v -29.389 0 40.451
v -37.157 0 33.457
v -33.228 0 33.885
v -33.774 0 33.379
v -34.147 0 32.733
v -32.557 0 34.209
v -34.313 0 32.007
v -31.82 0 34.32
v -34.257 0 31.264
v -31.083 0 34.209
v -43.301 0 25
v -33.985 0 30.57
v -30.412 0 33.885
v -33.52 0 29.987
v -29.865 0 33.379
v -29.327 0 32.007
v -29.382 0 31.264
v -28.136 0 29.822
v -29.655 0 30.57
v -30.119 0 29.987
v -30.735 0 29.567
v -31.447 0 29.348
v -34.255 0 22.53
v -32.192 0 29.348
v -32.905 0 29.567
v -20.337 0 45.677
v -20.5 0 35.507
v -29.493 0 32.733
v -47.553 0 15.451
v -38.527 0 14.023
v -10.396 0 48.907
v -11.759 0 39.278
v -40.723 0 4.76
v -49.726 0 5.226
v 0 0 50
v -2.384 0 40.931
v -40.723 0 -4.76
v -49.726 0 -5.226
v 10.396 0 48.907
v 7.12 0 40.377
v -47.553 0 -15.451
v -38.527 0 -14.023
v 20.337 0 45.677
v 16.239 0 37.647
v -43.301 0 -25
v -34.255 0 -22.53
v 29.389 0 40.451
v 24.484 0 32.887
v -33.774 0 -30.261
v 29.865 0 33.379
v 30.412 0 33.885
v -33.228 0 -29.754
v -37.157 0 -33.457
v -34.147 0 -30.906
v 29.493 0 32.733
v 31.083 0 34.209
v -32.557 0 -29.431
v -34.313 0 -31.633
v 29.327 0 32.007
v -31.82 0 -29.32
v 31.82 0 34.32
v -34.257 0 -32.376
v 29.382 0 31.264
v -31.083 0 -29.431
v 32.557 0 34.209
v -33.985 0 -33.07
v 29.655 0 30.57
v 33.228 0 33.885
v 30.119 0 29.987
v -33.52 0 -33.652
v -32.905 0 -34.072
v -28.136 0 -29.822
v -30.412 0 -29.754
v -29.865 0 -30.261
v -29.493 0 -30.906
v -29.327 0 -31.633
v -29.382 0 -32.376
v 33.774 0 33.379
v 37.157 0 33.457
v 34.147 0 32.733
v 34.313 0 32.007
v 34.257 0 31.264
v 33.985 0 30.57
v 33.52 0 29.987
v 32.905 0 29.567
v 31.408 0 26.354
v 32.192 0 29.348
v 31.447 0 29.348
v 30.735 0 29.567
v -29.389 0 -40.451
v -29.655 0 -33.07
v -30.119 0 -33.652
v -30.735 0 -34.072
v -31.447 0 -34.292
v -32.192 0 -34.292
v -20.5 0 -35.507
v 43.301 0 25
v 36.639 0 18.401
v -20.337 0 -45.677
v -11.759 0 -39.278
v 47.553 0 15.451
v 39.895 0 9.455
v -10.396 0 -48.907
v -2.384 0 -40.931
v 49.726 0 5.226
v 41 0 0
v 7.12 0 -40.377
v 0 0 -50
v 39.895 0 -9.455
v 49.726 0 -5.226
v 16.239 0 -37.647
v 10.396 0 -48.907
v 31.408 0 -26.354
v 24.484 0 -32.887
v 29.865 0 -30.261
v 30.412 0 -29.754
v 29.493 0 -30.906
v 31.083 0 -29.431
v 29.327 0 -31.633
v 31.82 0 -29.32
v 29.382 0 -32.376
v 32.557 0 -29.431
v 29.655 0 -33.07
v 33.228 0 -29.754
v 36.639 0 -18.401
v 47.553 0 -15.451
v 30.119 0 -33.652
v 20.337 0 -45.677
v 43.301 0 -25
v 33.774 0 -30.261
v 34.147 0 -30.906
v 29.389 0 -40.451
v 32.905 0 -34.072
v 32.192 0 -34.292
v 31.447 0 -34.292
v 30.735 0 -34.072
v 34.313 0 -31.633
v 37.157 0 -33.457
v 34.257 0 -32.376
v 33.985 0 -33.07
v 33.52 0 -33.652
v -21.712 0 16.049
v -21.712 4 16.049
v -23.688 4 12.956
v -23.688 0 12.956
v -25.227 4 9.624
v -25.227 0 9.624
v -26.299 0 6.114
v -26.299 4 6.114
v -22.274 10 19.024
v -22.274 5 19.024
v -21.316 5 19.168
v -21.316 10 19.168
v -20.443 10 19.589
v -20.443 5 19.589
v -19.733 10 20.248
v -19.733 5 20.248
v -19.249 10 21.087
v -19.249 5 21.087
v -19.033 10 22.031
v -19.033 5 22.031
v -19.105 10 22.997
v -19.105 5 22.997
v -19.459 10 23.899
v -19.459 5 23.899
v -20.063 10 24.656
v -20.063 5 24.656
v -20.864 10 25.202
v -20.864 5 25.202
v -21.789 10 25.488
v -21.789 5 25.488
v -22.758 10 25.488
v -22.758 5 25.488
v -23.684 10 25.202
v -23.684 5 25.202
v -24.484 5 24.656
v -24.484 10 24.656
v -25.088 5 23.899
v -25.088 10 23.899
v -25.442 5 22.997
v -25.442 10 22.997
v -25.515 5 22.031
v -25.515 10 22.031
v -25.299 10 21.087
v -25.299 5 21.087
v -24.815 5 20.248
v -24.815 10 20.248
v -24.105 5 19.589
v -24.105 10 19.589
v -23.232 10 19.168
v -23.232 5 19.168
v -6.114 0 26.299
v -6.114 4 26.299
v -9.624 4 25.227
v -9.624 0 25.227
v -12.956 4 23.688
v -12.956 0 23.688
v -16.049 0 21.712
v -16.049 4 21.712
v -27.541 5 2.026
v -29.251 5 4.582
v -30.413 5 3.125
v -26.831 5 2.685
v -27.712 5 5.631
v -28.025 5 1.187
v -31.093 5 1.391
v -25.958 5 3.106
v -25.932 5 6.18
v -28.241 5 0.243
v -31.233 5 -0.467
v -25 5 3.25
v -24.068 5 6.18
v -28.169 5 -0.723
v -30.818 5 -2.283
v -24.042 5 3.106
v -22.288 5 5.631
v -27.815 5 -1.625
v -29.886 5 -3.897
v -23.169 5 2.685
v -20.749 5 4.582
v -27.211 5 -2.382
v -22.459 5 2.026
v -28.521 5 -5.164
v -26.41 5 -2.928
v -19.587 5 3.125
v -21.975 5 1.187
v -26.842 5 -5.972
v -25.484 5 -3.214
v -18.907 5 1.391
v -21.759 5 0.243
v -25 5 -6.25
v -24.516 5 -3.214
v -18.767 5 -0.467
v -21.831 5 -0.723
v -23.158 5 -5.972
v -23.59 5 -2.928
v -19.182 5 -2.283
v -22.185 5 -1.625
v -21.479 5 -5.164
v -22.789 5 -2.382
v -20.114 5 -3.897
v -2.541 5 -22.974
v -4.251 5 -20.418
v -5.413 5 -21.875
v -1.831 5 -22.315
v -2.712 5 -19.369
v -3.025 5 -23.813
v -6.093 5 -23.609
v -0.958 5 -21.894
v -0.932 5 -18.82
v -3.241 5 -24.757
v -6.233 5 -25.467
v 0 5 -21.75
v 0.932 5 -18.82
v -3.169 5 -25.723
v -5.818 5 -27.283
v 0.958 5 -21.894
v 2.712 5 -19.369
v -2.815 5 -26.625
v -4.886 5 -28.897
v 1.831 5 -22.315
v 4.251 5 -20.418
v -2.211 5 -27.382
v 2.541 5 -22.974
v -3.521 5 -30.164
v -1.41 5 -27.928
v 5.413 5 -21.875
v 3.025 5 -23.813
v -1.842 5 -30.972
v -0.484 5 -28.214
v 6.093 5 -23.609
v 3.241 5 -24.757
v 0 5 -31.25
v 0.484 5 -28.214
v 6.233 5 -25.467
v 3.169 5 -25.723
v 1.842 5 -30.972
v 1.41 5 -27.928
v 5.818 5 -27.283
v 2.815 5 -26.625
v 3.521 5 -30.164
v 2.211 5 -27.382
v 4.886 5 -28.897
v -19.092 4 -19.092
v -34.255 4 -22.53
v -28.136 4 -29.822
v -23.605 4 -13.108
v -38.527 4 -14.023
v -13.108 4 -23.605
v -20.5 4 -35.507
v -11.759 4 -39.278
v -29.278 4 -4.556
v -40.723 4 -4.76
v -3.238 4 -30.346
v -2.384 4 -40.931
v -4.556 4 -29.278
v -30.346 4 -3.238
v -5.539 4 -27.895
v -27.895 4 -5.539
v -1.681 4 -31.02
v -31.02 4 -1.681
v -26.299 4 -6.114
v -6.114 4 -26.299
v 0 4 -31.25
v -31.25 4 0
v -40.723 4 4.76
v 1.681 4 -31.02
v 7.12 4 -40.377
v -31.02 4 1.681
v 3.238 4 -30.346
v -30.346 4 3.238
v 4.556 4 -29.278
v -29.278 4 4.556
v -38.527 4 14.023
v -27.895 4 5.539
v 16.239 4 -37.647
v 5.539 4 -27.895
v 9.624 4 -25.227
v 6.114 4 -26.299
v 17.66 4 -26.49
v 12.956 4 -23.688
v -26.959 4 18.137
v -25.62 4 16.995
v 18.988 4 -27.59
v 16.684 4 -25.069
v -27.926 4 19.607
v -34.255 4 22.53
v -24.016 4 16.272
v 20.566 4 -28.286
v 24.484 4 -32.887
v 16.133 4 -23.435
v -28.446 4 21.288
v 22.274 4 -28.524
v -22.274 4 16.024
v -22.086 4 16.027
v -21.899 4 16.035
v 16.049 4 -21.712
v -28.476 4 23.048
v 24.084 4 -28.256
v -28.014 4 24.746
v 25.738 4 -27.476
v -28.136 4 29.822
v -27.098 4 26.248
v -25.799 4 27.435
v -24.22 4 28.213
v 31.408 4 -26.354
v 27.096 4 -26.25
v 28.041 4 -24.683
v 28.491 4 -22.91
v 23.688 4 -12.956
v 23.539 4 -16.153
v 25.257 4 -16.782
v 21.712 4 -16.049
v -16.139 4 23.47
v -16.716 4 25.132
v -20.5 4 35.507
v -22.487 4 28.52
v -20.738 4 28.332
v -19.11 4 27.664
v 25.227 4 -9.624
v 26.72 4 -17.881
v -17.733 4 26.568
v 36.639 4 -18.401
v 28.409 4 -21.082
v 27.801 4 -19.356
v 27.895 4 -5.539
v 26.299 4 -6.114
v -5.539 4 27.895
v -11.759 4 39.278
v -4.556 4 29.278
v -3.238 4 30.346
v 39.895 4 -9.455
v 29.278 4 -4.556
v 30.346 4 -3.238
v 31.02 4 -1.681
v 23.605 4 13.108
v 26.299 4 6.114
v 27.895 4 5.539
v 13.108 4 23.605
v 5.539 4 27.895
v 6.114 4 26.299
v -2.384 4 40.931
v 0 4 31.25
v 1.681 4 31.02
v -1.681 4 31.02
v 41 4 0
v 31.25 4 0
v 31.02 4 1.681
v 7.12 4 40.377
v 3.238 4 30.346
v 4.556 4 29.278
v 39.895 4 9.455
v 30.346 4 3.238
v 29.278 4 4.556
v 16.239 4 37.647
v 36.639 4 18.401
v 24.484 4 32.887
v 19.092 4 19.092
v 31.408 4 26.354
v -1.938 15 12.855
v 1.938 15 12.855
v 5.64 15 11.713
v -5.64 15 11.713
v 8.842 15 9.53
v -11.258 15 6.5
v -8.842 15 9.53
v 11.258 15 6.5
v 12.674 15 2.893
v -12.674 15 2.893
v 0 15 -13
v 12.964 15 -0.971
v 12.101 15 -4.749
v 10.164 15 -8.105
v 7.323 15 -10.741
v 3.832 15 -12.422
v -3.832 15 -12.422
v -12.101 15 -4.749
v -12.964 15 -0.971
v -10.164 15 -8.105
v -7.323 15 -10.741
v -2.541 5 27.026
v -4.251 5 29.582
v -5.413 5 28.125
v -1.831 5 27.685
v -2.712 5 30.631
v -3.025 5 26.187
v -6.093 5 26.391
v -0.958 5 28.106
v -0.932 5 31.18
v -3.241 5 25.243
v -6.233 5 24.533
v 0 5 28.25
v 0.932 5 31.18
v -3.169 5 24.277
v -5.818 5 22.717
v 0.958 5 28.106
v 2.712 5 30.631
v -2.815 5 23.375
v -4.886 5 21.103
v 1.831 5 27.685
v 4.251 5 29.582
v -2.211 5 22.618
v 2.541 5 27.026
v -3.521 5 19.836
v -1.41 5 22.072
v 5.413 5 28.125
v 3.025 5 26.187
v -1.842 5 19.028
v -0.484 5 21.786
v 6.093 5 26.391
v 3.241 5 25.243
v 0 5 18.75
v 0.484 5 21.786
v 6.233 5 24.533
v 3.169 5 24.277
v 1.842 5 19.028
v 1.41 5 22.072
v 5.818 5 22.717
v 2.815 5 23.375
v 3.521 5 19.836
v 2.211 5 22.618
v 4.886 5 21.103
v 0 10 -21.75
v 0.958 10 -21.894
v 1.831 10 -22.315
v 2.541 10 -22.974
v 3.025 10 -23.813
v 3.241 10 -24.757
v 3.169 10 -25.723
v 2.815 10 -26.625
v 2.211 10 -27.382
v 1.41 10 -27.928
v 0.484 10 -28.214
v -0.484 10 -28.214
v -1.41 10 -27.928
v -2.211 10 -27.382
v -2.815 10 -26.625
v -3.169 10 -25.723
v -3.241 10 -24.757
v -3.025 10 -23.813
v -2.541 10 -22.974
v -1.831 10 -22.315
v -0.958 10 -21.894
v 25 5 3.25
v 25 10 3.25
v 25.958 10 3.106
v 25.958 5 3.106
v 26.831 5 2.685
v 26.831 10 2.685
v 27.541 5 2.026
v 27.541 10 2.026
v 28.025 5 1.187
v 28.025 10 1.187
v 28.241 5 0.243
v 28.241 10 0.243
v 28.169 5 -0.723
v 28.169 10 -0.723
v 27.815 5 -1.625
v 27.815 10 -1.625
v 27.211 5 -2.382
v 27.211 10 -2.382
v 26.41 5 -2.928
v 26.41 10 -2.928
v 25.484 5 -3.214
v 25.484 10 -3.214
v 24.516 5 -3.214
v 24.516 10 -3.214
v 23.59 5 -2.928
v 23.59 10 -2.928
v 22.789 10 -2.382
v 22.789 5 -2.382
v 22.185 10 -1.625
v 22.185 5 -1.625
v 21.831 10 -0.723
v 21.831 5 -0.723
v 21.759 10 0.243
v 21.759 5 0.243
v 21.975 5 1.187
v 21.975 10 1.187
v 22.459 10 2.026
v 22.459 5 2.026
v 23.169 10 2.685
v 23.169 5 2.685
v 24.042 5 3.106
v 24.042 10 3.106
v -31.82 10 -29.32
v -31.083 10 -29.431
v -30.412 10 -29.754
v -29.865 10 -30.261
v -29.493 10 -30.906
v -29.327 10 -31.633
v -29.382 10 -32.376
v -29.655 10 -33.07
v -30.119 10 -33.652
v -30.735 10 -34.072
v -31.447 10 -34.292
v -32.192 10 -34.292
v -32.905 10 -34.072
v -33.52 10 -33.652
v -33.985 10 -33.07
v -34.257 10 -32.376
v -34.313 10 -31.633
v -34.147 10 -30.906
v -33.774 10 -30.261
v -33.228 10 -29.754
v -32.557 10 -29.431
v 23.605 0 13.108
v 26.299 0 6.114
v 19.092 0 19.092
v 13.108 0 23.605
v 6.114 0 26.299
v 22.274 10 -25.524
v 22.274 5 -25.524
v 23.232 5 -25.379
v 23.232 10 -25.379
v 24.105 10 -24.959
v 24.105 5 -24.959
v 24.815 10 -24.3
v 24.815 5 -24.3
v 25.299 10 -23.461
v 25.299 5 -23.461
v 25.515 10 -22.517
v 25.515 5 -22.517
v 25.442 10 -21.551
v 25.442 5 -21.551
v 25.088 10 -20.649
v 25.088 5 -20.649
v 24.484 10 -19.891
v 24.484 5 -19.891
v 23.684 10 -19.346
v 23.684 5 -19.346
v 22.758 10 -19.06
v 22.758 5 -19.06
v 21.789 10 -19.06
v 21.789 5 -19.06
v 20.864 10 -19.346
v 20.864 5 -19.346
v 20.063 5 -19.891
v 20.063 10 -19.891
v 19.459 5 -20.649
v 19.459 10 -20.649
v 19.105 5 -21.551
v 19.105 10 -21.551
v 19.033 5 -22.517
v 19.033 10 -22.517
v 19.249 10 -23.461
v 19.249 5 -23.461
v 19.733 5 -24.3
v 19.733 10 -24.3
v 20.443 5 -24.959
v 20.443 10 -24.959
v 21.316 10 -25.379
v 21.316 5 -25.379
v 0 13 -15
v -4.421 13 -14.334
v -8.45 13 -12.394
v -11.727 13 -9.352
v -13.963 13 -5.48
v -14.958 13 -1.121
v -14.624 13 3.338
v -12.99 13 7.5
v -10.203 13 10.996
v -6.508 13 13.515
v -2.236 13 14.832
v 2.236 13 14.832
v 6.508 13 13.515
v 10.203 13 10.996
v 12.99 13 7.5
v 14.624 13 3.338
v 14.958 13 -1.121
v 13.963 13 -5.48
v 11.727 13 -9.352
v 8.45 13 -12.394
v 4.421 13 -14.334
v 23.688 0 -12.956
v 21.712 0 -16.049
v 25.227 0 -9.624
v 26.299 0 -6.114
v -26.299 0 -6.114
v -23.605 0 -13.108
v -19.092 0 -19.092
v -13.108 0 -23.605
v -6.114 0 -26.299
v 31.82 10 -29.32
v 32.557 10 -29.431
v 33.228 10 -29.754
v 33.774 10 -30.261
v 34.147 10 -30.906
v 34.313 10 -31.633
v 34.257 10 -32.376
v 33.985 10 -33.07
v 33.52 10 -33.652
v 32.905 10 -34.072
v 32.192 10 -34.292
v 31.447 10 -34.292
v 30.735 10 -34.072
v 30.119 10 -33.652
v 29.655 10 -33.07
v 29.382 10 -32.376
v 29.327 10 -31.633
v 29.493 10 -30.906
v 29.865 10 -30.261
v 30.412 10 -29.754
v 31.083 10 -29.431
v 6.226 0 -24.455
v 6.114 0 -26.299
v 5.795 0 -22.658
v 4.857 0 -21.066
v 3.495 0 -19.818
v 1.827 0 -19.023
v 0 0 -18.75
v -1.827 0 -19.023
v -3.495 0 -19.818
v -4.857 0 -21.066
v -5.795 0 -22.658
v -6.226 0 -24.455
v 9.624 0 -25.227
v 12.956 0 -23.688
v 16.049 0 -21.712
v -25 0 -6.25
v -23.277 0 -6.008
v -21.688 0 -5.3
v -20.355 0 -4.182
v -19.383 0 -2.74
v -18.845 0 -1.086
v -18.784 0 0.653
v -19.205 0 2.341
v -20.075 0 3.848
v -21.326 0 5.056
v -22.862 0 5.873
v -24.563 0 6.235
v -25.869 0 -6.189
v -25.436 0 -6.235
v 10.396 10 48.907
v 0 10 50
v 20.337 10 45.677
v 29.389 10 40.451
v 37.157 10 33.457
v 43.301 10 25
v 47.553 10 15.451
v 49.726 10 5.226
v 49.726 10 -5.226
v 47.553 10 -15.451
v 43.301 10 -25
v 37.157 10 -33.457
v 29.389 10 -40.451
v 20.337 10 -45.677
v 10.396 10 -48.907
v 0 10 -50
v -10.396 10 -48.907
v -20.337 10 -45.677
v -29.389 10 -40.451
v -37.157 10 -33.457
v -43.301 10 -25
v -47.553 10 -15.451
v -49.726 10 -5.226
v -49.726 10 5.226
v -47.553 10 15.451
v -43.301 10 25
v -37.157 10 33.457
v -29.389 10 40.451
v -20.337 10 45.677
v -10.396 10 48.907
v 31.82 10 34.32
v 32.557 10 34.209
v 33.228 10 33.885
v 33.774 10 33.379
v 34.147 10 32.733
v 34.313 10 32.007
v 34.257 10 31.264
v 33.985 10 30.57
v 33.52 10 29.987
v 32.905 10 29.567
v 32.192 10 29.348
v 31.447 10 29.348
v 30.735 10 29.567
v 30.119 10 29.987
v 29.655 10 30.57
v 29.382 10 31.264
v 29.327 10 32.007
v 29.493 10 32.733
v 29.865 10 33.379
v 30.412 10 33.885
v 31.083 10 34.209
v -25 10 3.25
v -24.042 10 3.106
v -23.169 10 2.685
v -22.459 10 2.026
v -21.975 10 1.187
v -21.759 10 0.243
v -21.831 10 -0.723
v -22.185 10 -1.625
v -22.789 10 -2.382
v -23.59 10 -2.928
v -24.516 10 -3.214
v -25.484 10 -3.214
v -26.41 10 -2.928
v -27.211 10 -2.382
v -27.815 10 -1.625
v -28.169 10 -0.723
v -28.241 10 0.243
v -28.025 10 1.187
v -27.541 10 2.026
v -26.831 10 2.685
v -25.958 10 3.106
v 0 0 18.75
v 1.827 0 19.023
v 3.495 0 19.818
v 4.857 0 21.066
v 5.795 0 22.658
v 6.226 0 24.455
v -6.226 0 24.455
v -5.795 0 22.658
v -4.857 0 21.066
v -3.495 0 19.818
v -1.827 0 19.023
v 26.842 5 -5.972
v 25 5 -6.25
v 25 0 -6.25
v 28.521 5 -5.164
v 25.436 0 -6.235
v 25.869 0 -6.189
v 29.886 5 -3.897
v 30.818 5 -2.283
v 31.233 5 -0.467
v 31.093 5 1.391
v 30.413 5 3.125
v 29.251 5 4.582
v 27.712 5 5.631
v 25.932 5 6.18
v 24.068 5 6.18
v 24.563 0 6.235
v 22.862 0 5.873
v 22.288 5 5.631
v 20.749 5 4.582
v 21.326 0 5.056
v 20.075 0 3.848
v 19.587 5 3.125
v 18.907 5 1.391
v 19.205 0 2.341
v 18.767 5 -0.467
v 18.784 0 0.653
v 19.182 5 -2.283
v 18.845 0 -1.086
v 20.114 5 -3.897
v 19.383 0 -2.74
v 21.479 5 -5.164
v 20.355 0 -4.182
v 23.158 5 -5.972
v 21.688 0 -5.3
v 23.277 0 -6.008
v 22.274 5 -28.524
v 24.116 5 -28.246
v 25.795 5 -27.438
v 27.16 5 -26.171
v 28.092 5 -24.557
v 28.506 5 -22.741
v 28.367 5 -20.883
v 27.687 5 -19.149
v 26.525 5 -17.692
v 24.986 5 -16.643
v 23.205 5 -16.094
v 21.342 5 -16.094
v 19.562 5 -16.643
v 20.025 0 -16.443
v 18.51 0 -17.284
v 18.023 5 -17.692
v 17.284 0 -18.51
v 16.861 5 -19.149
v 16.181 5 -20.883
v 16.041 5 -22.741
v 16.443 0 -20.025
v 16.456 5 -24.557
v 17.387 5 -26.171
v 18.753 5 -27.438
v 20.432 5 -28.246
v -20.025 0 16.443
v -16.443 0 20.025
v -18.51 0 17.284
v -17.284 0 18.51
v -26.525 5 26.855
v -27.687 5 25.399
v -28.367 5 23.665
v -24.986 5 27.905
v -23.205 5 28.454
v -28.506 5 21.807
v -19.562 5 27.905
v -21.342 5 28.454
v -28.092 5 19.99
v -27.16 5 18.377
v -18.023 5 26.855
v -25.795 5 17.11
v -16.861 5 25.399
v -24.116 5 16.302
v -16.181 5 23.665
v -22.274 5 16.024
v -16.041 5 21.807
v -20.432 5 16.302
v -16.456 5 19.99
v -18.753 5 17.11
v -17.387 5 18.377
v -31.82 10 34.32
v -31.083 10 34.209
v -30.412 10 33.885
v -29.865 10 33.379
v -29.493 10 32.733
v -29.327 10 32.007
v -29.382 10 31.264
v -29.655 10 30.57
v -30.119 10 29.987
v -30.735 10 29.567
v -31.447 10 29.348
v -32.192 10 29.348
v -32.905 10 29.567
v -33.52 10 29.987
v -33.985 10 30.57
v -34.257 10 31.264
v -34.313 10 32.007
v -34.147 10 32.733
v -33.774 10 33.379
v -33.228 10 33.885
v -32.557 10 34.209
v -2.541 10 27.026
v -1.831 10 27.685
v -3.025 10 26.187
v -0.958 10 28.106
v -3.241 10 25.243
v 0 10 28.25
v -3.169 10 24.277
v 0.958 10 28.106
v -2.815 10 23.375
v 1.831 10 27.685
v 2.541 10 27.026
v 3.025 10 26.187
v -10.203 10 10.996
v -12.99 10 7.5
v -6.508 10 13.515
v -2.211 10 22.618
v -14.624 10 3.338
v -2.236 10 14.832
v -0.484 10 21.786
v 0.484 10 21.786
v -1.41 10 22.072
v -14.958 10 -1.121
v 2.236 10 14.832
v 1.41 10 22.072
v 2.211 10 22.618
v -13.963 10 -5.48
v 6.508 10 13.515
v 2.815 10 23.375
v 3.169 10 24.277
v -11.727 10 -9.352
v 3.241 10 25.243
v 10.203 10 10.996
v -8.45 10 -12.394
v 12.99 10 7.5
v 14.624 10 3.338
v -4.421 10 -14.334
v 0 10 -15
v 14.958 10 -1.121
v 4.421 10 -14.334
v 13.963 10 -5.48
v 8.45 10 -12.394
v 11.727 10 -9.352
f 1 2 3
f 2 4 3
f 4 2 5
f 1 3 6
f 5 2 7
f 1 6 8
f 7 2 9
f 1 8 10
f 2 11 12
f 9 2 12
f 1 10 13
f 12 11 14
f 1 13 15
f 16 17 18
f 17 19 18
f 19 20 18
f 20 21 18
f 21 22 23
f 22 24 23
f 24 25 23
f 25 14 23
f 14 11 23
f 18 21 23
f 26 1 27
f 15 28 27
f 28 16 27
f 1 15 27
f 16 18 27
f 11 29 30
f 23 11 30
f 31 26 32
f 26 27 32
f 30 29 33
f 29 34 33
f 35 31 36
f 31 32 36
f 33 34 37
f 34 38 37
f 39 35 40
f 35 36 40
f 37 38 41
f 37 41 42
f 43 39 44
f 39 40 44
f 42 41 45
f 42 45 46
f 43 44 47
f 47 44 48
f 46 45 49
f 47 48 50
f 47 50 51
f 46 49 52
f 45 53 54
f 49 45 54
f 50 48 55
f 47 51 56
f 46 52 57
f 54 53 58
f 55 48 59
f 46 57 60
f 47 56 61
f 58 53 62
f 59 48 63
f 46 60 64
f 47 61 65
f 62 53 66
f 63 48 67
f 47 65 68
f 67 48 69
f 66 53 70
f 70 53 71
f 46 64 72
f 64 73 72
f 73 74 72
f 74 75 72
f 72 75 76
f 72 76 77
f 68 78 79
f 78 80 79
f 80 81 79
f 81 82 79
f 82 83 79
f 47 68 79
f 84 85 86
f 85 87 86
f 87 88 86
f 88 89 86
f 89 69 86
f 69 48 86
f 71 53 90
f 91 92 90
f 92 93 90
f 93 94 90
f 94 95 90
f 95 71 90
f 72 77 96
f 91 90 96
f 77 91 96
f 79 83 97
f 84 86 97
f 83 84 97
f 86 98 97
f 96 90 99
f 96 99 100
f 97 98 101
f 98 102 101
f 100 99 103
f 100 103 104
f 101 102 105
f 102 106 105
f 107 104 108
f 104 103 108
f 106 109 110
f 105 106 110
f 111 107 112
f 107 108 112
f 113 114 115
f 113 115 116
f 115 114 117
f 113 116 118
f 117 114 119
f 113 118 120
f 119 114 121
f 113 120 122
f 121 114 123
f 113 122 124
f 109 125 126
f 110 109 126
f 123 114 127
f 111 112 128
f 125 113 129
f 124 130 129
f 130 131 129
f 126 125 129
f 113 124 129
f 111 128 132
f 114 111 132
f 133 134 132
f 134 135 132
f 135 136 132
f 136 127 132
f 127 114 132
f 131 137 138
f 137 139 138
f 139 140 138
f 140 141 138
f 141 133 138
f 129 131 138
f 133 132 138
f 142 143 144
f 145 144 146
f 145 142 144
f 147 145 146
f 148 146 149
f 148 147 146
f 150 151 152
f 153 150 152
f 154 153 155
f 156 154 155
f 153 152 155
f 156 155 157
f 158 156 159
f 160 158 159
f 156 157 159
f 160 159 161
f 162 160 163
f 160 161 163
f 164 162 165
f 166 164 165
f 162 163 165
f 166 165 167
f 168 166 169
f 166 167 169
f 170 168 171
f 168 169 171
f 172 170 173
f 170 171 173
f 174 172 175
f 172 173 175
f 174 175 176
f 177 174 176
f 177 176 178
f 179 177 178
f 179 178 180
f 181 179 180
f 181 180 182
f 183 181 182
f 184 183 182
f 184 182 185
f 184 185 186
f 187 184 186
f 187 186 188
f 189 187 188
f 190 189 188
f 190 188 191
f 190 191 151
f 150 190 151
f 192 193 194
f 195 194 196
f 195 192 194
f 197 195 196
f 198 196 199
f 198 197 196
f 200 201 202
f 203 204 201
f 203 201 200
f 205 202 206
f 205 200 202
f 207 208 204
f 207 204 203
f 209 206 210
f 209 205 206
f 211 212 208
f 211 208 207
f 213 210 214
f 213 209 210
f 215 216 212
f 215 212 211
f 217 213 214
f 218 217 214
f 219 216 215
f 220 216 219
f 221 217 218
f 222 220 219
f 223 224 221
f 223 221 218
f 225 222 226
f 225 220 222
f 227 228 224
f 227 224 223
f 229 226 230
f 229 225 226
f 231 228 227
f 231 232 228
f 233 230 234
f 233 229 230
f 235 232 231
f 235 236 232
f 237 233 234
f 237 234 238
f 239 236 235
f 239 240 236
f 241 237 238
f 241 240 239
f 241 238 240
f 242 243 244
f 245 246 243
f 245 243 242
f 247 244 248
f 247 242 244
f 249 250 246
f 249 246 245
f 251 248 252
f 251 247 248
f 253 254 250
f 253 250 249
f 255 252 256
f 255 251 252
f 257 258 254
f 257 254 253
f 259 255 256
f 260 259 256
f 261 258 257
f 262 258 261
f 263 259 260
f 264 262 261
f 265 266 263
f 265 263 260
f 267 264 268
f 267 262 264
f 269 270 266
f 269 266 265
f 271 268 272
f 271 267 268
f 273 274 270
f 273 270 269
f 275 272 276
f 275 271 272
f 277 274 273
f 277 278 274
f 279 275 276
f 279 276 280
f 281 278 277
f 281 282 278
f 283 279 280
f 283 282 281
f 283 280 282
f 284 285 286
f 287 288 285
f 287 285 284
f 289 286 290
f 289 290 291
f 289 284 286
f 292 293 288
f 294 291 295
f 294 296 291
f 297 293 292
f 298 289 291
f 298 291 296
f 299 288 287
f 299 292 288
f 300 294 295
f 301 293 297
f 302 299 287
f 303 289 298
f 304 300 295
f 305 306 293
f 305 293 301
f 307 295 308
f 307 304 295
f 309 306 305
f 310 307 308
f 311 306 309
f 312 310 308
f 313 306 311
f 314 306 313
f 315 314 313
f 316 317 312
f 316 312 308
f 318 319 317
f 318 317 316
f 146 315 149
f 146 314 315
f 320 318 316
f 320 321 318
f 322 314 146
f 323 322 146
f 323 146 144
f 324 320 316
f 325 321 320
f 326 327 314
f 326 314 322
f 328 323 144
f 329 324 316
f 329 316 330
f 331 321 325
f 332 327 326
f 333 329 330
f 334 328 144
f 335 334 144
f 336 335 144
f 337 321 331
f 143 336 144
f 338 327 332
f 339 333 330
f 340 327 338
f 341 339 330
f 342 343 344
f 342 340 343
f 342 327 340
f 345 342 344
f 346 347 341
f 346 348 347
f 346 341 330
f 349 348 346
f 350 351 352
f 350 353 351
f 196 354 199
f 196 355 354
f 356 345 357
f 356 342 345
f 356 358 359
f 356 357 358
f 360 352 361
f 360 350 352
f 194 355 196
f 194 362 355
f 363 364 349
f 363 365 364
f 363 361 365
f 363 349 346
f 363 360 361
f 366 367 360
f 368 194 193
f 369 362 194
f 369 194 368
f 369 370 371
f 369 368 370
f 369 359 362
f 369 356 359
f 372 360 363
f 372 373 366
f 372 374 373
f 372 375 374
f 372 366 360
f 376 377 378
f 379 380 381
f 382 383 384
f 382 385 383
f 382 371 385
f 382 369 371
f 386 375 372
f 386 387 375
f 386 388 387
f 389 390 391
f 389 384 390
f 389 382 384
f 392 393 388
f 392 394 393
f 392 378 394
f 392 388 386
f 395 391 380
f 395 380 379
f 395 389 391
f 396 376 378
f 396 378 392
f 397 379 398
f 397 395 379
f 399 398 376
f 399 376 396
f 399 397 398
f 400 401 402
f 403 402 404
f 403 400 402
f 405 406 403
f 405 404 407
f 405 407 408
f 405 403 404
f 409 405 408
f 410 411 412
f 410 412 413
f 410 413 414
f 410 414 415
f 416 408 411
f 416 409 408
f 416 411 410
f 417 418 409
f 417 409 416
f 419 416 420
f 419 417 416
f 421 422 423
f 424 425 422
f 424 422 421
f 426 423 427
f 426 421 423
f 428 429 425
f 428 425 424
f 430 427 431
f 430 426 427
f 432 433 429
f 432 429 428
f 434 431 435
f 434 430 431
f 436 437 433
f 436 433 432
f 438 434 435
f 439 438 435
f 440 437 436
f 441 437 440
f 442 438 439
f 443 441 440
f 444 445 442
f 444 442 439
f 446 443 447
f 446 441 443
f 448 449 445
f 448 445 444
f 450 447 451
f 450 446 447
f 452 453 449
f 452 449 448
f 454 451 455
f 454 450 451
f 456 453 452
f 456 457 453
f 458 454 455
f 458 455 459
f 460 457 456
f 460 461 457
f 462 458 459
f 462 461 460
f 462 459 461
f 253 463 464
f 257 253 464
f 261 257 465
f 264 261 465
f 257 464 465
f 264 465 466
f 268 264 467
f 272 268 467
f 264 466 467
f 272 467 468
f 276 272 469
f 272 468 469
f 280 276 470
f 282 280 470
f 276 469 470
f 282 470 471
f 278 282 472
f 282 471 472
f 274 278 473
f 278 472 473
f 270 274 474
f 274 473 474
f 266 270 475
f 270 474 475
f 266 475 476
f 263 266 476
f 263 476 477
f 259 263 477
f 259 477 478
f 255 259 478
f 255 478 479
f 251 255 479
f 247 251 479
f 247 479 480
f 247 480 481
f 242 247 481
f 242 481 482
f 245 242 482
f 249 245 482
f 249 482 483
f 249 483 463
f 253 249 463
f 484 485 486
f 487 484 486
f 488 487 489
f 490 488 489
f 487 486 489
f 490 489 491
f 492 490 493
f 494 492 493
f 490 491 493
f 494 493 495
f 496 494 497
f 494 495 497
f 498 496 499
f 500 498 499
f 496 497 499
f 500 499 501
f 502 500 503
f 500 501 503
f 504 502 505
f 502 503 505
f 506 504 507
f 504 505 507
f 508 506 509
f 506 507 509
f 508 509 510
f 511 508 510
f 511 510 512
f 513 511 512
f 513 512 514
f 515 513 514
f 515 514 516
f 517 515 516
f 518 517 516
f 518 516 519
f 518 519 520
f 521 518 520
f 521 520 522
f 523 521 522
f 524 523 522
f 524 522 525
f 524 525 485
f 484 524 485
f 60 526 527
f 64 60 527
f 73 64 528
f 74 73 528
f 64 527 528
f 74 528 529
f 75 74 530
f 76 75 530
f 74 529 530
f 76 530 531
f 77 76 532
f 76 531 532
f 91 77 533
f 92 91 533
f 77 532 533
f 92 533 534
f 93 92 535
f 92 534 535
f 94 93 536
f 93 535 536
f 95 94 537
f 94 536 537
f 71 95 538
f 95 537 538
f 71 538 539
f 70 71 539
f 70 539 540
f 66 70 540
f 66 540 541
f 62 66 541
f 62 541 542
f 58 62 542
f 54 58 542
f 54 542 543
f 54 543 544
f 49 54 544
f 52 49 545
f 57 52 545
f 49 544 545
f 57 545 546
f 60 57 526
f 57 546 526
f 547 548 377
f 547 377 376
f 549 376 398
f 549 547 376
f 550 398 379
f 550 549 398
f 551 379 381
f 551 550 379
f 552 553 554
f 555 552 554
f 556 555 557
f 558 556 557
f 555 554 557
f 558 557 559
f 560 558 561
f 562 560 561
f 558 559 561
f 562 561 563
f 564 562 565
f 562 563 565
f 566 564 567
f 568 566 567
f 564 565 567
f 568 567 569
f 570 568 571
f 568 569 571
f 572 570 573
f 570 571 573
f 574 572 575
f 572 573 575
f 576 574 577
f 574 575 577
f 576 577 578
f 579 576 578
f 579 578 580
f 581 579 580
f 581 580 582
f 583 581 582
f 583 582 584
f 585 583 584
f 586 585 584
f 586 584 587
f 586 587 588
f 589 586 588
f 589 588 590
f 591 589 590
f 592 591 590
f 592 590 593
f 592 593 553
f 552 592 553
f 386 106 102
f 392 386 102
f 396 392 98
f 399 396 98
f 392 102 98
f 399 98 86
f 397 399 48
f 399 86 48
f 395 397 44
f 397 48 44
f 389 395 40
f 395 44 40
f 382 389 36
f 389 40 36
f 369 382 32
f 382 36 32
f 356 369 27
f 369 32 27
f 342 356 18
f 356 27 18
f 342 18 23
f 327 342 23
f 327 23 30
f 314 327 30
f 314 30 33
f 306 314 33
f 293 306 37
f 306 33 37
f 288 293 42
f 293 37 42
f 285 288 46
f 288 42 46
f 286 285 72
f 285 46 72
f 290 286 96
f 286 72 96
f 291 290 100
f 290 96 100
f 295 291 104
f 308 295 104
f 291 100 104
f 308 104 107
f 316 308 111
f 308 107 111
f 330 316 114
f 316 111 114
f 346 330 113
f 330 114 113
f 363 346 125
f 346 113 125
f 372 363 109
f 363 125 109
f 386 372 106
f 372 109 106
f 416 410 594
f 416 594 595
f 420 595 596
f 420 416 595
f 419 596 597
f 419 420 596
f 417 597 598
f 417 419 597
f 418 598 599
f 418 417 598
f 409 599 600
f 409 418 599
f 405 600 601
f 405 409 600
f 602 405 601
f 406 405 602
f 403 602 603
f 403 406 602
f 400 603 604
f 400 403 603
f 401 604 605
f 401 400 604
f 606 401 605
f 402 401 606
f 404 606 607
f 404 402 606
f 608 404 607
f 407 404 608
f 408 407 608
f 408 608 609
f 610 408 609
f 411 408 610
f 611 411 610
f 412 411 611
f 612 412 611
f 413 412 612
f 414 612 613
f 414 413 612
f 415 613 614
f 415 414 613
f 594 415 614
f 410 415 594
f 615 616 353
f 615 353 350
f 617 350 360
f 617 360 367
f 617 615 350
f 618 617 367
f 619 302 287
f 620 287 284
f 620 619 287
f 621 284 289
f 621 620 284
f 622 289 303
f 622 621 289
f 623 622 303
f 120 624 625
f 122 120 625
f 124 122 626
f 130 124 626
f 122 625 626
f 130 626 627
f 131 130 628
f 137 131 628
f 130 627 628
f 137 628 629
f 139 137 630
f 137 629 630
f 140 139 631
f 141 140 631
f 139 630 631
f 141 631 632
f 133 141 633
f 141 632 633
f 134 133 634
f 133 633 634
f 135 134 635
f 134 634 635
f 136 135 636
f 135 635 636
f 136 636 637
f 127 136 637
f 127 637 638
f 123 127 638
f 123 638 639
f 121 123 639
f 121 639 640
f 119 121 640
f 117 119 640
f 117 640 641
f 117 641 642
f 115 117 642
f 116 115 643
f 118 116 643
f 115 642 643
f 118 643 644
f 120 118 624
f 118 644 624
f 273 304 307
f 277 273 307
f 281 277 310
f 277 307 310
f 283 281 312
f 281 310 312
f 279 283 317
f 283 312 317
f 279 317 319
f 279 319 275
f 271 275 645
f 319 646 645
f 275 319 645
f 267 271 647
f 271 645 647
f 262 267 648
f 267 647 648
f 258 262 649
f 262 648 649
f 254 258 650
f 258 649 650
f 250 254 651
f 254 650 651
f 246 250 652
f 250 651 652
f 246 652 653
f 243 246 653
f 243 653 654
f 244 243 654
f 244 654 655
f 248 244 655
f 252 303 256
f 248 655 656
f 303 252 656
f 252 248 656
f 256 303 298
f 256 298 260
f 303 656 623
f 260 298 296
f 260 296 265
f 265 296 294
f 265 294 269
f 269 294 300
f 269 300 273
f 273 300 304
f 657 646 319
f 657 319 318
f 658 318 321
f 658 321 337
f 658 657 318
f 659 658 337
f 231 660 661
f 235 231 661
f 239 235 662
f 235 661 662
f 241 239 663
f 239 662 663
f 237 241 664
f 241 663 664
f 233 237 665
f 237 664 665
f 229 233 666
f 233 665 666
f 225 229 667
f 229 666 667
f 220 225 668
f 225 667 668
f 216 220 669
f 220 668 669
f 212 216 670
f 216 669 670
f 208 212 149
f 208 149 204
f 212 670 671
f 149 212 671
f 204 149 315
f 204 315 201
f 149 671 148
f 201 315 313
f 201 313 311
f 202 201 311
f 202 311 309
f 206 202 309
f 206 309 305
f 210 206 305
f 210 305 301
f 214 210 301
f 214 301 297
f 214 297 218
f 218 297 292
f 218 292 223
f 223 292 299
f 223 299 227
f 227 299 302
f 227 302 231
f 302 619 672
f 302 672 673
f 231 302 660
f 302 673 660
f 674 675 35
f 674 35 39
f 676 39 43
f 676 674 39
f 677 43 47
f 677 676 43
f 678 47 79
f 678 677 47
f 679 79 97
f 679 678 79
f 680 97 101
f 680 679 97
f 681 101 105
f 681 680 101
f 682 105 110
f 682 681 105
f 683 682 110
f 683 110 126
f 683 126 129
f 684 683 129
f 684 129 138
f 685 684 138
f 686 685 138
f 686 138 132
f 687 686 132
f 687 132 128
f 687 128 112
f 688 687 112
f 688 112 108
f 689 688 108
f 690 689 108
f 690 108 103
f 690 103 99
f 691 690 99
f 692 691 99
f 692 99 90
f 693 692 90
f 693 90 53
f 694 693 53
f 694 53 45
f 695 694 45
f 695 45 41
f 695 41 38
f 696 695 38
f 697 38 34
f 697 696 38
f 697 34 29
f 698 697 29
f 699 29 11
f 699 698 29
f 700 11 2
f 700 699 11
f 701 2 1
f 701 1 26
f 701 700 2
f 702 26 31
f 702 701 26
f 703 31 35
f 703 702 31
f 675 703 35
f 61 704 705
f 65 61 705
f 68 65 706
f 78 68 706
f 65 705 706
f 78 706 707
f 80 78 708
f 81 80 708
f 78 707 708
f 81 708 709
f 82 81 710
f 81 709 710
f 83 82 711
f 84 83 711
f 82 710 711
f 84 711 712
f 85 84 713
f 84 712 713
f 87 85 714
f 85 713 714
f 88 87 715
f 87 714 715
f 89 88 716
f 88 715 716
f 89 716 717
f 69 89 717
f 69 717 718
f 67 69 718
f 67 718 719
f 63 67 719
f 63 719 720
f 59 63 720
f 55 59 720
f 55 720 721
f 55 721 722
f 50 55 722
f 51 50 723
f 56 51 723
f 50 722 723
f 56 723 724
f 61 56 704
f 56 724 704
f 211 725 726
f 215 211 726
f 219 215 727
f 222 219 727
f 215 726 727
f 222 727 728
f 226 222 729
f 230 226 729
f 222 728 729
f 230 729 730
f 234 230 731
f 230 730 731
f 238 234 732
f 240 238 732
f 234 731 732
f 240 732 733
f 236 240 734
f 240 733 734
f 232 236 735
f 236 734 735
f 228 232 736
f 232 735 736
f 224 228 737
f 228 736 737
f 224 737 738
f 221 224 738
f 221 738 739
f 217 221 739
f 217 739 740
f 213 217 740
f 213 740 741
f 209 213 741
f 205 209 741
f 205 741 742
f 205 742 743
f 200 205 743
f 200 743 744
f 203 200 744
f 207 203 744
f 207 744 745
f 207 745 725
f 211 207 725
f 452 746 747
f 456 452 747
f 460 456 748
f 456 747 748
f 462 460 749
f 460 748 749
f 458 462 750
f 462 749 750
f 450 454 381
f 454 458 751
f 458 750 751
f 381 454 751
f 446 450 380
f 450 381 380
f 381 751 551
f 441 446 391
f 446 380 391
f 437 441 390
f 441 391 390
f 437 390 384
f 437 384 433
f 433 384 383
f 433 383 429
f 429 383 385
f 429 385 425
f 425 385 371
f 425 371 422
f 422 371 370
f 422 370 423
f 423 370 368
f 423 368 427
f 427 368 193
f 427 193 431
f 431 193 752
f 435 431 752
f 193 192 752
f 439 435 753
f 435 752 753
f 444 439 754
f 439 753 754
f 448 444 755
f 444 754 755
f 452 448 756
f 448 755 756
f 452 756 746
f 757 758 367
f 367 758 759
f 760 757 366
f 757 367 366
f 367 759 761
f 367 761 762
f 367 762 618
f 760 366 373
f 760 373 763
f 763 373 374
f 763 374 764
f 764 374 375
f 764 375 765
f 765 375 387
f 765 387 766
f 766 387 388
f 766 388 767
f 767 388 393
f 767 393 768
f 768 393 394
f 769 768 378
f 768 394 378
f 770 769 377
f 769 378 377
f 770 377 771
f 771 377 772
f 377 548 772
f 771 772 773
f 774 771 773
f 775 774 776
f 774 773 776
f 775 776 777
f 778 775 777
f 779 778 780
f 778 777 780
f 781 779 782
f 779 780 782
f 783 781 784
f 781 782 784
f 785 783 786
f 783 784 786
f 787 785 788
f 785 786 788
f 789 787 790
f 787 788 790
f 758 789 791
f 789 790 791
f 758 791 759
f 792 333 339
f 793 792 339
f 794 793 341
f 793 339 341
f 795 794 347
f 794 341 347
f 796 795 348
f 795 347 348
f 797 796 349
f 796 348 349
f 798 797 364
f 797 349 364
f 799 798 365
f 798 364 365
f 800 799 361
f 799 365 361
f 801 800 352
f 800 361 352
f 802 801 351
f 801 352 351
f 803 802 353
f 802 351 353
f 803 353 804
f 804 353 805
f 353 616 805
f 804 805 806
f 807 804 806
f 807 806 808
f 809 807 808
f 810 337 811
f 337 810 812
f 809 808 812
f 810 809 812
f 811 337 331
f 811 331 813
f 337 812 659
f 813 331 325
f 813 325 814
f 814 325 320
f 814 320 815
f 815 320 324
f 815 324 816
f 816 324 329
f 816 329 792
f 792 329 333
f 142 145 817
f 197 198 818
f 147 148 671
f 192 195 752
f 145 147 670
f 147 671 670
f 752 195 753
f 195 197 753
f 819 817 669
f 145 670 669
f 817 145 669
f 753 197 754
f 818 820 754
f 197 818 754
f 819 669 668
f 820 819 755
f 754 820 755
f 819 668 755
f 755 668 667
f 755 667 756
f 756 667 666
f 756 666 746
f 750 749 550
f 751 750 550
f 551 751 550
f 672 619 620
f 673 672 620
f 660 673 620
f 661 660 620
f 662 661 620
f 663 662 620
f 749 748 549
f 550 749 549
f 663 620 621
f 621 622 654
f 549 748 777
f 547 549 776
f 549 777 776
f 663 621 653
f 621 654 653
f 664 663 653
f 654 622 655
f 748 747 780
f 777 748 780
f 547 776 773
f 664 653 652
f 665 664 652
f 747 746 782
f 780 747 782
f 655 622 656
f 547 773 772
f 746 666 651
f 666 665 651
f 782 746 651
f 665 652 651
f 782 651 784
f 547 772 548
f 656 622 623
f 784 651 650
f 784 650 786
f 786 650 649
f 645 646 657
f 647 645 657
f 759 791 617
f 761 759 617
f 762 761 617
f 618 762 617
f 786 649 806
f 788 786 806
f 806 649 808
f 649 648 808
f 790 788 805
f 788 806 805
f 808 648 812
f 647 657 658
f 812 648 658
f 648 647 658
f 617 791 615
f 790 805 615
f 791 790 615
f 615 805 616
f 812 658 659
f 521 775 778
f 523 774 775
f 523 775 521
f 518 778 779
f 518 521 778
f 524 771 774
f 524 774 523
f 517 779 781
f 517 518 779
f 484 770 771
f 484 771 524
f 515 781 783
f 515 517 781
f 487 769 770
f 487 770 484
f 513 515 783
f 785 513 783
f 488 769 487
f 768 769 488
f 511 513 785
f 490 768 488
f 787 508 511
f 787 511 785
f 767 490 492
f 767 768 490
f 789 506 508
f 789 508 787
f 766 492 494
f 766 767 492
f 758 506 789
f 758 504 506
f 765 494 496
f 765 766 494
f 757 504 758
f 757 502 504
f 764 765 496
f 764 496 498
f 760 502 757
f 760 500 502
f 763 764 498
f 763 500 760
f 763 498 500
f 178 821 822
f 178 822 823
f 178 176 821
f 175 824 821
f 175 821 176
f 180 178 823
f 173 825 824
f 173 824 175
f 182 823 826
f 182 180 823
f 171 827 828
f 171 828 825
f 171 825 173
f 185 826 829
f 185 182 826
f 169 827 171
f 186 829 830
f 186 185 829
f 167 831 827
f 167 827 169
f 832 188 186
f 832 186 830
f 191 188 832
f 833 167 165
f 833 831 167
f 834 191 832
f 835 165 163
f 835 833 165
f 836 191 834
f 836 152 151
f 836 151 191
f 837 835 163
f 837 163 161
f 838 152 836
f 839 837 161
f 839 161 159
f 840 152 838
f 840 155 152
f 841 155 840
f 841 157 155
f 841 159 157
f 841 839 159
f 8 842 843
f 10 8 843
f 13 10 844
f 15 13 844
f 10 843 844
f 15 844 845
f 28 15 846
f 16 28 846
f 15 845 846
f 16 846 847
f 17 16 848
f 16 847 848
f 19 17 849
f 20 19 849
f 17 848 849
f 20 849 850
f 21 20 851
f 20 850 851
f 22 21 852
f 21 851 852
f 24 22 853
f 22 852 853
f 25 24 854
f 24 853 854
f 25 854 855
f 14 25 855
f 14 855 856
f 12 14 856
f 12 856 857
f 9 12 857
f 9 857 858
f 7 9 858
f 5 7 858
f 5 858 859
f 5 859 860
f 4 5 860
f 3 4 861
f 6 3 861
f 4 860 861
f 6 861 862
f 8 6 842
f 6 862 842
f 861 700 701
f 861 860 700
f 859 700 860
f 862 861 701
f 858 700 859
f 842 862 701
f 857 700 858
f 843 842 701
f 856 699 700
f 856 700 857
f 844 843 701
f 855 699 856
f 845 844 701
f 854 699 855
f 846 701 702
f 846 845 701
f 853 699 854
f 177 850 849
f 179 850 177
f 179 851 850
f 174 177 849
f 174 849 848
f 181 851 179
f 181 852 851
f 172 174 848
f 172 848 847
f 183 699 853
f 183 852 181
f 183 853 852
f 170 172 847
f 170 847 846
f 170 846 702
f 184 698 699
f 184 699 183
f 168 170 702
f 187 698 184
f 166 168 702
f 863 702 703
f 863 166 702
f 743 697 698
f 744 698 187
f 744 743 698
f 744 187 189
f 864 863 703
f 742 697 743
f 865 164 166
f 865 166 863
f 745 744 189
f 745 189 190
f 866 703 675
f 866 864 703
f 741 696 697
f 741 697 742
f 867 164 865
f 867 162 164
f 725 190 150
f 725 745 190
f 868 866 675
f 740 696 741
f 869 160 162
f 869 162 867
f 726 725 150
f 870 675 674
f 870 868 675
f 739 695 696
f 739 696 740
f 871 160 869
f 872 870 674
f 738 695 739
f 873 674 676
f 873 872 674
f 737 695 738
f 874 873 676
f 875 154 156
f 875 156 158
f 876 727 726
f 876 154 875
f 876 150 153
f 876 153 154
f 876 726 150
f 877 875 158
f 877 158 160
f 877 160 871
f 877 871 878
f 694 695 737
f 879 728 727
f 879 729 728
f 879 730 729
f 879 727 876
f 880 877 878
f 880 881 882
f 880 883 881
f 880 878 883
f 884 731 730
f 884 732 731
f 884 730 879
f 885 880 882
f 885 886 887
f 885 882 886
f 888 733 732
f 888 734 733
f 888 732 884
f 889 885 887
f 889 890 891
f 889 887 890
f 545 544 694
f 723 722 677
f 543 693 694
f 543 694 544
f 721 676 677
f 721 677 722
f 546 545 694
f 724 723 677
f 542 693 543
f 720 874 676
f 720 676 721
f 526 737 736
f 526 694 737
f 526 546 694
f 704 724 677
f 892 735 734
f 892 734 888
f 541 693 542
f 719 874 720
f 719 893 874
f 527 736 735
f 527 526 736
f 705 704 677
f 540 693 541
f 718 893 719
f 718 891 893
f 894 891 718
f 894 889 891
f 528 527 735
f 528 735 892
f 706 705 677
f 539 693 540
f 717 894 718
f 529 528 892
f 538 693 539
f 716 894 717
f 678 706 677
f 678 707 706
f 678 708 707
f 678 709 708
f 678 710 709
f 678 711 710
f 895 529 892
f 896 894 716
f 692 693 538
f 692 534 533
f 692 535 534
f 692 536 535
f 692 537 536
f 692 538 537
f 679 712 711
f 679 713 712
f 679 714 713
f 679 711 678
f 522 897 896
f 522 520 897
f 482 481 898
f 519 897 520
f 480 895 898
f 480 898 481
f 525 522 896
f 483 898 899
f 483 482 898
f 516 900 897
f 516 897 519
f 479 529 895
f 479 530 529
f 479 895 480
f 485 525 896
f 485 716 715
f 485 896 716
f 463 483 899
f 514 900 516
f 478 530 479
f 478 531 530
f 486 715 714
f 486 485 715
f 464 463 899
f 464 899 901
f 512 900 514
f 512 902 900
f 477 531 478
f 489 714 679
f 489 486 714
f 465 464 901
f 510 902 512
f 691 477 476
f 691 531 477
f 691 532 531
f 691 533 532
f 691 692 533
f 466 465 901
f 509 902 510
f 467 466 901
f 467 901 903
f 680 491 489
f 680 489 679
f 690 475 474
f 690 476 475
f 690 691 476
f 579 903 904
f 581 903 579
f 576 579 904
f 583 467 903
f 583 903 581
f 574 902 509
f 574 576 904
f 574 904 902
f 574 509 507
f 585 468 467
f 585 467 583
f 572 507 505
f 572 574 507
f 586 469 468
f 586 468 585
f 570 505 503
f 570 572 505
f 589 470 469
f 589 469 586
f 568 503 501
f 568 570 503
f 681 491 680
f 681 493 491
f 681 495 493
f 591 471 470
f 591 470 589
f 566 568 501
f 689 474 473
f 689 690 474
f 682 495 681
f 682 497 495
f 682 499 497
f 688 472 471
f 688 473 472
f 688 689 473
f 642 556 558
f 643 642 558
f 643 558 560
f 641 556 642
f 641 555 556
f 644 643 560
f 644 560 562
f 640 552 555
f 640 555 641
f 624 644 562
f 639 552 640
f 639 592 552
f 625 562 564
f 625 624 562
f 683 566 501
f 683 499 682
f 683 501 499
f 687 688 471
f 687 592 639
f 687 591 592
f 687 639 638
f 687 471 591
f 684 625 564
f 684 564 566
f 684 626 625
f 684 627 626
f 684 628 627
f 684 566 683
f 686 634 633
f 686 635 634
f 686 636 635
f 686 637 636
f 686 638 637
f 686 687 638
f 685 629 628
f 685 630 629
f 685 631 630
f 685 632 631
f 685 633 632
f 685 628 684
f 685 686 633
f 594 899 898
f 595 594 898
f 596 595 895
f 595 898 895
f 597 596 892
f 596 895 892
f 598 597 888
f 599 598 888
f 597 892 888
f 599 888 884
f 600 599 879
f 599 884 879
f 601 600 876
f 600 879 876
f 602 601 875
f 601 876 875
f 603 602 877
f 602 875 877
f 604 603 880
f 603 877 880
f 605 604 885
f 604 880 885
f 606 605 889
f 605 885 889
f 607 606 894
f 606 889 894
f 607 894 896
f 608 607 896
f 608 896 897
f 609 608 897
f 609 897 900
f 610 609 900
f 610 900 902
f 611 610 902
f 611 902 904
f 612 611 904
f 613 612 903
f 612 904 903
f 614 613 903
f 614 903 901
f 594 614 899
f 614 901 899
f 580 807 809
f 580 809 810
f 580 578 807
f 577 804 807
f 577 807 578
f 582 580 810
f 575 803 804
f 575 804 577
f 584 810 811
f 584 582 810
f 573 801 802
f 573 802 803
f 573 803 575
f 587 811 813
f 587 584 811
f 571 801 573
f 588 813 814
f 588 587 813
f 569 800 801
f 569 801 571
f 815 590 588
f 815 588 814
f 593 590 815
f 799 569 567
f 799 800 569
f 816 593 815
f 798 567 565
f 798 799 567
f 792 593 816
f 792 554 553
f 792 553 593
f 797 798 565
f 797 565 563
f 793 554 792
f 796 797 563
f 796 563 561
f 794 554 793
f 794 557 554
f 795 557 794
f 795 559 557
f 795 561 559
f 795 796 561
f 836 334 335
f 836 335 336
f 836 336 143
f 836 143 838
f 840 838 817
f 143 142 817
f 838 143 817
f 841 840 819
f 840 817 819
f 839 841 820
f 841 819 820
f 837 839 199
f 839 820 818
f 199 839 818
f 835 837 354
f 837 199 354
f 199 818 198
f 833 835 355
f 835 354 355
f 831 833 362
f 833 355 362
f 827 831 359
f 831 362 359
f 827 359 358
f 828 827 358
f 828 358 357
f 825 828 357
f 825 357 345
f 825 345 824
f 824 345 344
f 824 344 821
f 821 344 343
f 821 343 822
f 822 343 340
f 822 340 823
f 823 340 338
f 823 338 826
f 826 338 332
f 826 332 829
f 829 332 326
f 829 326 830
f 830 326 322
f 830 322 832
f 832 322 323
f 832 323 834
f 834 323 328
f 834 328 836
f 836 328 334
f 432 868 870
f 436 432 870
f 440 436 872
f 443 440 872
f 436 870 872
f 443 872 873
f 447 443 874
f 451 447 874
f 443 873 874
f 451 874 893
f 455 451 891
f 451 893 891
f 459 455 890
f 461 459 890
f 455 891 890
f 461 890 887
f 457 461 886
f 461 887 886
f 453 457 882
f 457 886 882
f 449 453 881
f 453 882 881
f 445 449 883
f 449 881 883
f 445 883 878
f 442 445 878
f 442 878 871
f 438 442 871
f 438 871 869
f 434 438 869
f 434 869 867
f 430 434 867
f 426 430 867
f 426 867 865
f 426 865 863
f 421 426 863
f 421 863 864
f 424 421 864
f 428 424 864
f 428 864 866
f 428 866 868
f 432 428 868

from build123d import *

# Parameters (mm, degrees)
SKETCH1_W               = 100
SKETCH1_H               = 100
BOSS_EXTRUDE1_DEPTH     = 10
SKETCH2_R               = 3.25
CUT_EXTRUDE1_DEPTH      = 10
SKETCH3_OUTSIDE_W       = 130.354
SKETCH3_OUTSIDE_H       = 130.354
SKETCH3_OUTSIDE_R       = 50
CUT_EXTRUDE2_DEPTH      = 10
SKETCH4_R               = 2.5
CUT_EXTRUDE3_DEPTH      = 10
SKETCH5_R               = 3.25
CUT_EXTRUDE4_DEPTH      = 10
SKETCH6_R               = 6.25
CUT_EXTRUDE5_DEPTH      = 5
SKETCH7_R               = 15
BOSS_EXTRUDE2_DEPTH     = 5
CHAMFER1_SIZE           = 2
SKETCH8_R               = 41
SKETCH8_R_2             = 27
CUT_EXTRUDE_THIN1_DEPTH = 4


with BuildPart() as part:
    # Sketch1 → Boss-Extrude1 (new body)
    with BuildSketch(Plane(origin=(0, 0, 0), x_dir=(1, 0, 0), z_dir=(0, 1, 0))):
        Rectangle(SKETCH1_W, SKETCH1_H)
    extrude(amount=BOSS_EXTRUDE1_DEPTH)

    # Sketch2 → Cut-Extrude1 (cut)
    with BuildSketch(Plane(origin=(0, 10, 0), x_dir=(1, 0, 0), z_dir=(0, 1, 0))):
        with Locations(Location((-25, 0, 0), (0, 0, 270))):
            Circle(SKETCH2_R)
        with Locations(Location((0, 25, 0), (0, 0, 270))):
            Circle(SKETCH2_R)
        with Locations(Location((25, 0, 0), (0, 0, 270))):
            Circle(SKETCH2_R)
        with Locations(Location((0, -25, 0), (0, 0, 270))):
            Circle(SKETCH2_R)
    extrude(amount=-CUT_EXTRUDE1_DEPTH, mode=Mode.SUBTRACT)

    # Sketch3 outside → Cut-Extrude2 (cut)
    with BuildSketch(Plane(origin=(0, 10, 0), x_dir=(1, 0, 0), z_dir=(0, 1, 0))):
        Rectangle(SKETCH3_OUTSIDE_W, SKETCH3_OUTSIDE_H)
        with Locations(Location((0, 0, 0), (0, 0, 270))):
            Circle(SKETCH3_OUTSIDE_R, mode=Mode.SUBTRACT)
    extrude(amount=-CUT_EXTRUDE2_DEPTH, mode=Mode.SUBTRACT)

    # Sketch4 → Cut-Extrude3 (cut)
    with BuildSketch(Plane(origin=(0, 10, 0), x_dir=(1, 0, 0), z_dir=(0, 1, 0))):
        with Locations(Location((-31.819805153, 31.819805153, 0), (0, 0, 270))):
            Circle(SKETCH4_R)
        with Locations(Location((31.819805153, 31.819805153, 0), (0, 0, 270))):
            Circle(SKETCH4_R)
        with Locations(Location((31.819805153, -31.819805153, 0), (0, 0, 270))):
            Circle(SKETCH4_R)
        with Locations(Location((-31.819805153, -31.819805153, 0), (0, 0, 270))):
            Circle(SKETCH4_R)
    extrude(amount=-CUT_EXTRUDE3_DEPTH, mode=Mode.SUBTRACT)

    # Sketch5 → Cut-Extrude4 (cut)
    with BuildSketch(Plane.XZ):
        with Locations(Location((-22.273863607, 22.273863607, 0), (0, 0, 270))):
            Circle(SKETCH5_R)
        with Locations(Location((22.273863607, -22.273863607, 0), (0, 0, 270))):
            Circle(SKETCH5_R)
    extrude(amount=-CUT_EXTRUDE4_DEPTH, mode=Mode.SUBTRACT)

    # Sketch6 → Cut-Extrude5 (cut)
    with BuildSketch(Plane.XZ):
        with Locations(Location((25, 0, 0), (0, 0, 270))):
            Circle(SKETCH6_R)
        with Locations(Location((22.273863607, -22.273863607, 0), (0, 0, 270))):
            Circle(SKETCH6_R)
        with Locations(Location((0, -25, 0), (0, 0, 270))):
            Circle(SKETCH6_R)
        with Locations(Location((-25, 0, 0), (0, 0, 270))):
            Circle(SKETCH6_R)
        with Locations(Location((-22.273863607, 22.273863607, 0), (0, 0, 270))):
            Circle(SKETCH6_R)
        with Locations(Location((0, 25, 0), (0, 0, 270))):
            Circle(SKETCH6_R)
    extrude(amount=-CUT_EXTRUDE5_DEPTH, mode=Mode.SUBTRACT)

    # Sketch7 → Boss-Extrude2 (add)
    with BuildSketch(Plane(origin=(0, 10, 0), x_dir=(1, 0, 0), z_dir=(0, 1, 0))):
        with Locations(Location((0, 0, 0), (0, 0, 90))):
            Circle(SKETCH7_R)
    extrude(amount=BOSS_EXTRUDE2_DEPTH)

    # Chamfer1
    chamfer1_edges = [part.edges().sort_by_distance(p)[0] for p in [
        (0, 15, 15),
    ]]
    chamfer(chamfer1_edges, length=CHAMFER1_SIZE)

    # Sketch8 → Cut-Extrude-Thin1 (cut)
    with BuildSketch(Plane.XZ):
        Circle(SKETCH8_R)
        Circle(SKETCH8_R_2, mode=Mode.SUBTRACT)
    extrude(amount=-CUT_EXTRUDE_THIN1_DEPTH, mode=Mode.SUBTRACT)


solid = part.part
